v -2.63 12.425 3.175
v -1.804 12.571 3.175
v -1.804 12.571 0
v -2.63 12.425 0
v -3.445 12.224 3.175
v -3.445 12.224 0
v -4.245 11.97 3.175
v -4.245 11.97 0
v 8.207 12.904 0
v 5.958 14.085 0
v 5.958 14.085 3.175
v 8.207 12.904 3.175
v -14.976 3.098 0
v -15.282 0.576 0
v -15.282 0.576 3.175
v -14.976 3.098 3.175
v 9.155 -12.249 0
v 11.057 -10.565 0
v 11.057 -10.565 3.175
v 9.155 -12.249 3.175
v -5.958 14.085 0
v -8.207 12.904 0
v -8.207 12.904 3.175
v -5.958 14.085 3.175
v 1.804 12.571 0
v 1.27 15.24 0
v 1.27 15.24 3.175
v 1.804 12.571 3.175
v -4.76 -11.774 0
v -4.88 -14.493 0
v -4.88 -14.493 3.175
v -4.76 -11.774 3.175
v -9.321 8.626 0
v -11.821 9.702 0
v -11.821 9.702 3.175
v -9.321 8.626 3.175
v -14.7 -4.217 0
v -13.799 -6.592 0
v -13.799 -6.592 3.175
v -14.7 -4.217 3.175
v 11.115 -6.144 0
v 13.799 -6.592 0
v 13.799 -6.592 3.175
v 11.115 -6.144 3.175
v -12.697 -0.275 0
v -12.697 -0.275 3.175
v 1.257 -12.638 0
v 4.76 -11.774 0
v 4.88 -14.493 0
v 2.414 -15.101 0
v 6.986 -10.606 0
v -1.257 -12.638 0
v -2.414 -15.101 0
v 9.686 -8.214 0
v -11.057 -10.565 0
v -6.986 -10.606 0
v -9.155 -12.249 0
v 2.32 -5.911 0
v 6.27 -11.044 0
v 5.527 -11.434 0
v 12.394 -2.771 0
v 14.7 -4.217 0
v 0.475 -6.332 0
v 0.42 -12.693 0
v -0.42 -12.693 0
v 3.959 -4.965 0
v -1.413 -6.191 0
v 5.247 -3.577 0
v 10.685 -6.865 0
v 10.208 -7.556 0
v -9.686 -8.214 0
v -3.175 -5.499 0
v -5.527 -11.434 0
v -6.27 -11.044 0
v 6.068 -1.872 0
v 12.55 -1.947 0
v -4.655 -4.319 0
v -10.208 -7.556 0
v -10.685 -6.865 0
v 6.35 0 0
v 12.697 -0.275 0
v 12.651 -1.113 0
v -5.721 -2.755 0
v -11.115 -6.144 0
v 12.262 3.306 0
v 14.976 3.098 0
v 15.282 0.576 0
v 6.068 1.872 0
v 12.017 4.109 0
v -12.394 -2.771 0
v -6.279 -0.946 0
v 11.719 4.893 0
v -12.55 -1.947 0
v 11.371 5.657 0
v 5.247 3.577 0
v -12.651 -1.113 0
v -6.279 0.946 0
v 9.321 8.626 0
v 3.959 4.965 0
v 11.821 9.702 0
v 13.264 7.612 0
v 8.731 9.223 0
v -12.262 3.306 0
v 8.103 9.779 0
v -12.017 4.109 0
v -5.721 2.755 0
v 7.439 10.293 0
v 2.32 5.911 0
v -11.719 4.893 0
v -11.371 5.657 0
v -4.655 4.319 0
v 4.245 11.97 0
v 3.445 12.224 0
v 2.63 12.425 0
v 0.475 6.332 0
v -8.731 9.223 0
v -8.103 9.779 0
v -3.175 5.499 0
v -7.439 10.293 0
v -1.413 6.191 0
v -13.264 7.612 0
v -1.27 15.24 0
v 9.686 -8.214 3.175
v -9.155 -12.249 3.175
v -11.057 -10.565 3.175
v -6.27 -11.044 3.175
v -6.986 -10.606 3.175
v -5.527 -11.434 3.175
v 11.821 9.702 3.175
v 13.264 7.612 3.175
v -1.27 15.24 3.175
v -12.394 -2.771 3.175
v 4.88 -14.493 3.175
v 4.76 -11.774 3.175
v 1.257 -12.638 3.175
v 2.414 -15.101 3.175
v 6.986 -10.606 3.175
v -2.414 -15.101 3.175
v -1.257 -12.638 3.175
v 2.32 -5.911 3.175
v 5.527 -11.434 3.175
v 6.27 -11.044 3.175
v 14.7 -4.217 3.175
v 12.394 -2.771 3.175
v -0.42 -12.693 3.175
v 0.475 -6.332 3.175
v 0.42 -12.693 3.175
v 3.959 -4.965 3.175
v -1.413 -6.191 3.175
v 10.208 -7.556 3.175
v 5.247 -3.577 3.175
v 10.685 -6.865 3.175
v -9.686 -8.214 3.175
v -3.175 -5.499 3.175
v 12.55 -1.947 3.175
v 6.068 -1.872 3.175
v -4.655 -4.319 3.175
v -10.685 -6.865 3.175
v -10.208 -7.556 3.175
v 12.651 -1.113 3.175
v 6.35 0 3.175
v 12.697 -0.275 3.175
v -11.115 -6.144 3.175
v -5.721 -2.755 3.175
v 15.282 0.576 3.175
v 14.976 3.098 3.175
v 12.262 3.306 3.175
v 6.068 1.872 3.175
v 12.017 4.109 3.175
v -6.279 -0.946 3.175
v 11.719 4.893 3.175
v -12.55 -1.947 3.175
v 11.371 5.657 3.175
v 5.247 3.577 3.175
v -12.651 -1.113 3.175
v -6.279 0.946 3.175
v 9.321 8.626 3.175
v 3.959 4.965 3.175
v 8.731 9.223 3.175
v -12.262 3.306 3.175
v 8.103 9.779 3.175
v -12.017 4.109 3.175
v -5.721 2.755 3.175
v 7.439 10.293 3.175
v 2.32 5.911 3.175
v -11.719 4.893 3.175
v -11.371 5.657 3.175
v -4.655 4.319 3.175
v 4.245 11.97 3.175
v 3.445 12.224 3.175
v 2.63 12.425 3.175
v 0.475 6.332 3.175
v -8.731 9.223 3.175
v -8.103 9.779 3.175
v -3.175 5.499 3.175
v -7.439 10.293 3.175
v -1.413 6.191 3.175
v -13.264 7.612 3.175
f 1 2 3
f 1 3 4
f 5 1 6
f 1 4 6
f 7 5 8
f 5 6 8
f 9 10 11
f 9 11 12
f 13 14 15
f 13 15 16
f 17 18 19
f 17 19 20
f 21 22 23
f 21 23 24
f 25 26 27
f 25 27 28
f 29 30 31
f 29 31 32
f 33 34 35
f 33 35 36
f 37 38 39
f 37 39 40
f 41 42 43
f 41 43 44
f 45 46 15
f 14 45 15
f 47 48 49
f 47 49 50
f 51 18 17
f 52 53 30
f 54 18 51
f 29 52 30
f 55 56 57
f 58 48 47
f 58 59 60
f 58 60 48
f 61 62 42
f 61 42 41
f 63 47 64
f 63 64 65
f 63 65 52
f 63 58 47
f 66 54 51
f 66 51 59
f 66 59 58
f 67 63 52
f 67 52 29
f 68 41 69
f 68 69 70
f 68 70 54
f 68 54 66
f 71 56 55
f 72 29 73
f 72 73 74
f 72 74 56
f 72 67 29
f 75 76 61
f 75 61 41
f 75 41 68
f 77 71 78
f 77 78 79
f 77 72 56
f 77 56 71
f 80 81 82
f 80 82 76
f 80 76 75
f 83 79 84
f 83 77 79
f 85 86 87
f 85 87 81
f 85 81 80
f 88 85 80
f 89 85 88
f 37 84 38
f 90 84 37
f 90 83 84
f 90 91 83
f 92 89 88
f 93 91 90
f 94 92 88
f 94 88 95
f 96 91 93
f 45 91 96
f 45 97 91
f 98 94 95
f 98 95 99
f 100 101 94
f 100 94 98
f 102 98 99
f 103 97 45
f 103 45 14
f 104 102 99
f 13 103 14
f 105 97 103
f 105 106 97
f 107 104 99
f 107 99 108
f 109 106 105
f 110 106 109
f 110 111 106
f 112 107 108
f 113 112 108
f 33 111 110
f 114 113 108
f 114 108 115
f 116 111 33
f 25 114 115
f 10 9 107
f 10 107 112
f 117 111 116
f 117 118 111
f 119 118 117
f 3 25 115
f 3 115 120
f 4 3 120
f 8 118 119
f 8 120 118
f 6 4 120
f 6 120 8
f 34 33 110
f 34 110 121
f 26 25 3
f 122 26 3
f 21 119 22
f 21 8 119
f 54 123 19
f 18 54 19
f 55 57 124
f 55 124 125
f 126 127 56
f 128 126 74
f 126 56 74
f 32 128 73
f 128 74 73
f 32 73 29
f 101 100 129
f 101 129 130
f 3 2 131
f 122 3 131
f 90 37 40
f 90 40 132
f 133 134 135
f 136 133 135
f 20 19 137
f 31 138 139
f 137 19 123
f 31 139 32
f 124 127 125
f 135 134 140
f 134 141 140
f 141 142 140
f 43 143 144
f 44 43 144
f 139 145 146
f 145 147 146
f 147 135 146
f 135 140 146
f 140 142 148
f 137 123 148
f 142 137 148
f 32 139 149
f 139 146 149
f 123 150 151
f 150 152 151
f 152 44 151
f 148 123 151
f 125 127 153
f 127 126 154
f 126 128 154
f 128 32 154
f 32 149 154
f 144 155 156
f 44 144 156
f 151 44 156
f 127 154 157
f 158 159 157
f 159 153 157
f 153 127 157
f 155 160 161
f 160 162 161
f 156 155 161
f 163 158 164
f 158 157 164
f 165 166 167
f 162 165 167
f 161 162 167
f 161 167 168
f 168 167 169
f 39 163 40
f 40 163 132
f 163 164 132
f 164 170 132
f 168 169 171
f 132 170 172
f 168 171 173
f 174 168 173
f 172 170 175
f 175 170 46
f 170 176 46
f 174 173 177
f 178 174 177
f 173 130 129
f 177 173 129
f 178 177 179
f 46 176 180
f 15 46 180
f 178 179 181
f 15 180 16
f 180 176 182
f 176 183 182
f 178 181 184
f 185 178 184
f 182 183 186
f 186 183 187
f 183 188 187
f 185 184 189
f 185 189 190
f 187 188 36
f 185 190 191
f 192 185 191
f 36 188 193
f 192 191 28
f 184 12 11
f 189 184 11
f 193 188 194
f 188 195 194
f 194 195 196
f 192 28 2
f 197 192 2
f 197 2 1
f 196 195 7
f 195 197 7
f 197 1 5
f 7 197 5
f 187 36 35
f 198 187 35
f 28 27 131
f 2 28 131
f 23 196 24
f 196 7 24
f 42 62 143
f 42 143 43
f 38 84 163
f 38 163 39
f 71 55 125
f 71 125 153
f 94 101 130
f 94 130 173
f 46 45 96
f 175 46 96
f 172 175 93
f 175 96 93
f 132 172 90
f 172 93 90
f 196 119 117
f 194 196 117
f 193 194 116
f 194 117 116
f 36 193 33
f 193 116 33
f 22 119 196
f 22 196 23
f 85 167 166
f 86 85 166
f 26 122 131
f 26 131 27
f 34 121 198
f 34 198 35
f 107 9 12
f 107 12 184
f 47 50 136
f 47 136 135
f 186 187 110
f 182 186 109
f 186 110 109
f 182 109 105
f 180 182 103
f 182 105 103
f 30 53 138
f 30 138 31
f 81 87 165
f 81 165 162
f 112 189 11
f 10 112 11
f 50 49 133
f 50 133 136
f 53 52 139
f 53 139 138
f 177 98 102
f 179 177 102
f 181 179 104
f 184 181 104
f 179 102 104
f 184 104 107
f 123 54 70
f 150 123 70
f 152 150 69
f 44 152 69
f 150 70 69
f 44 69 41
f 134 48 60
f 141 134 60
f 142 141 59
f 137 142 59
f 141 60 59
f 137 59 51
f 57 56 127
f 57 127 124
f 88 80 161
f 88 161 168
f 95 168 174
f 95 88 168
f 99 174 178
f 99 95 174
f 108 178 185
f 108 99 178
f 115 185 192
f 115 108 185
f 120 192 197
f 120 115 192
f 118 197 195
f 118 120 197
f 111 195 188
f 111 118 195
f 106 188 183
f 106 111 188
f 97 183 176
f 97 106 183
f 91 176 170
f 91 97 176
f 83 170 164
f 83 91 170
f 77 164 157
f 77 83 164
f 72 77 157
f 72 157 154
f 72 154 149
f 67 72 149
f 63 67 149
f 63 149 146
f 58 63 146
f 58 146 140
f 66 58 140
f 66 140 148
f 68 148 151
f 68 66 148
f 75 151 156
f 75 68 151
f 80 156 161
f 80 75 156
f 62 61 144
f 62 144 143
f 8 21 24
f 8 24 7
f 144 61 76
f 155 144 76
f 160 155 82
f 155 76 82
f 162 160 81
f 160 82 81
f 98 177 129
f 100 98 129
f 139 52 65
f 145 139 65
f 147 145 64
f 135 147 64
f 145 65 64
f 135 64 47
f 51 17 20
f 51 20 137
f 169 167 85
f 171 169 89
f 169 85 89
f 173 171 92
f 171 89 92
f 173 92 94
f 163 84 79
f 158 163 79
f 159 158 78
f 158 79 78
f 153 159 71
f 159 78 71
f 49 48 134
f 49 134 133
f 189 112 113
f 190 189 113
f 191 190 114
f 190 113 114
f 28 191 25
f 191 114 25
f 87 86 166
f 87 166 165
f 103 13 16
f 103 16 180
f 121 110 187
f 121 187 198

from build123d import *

# Parameters (mm, degrees)
SKETCH1_R           = 12.7
SKETCH1_R_2         = 6.35
BOSS_EXTRUDE1_DEPTH = 3.175
BOSS_EXTRUDE2_DEPTH = 3.175
CIRPATTERN1_COUNT   = 13


with BuildPart() as part:
    # Sketch1 → Boss-Extrude1 (new body)
    with BuildSketch(Plane.XY):
        Circle(SKETCH1_R)
        Circle(SKETCH1_R_2, mode=Mode.SUBTRACT)
    extrude(amount=BOSS_EXTRUDE1_DEPTH)

    # Sketch2 → Boss-Extrude2 (add)
    with BuildSketch(Plane.XY):
        Polygon((-1.27, 15.24), (1.27, 15.24), (1.905, 12.065), (-1.905, 12.065), align=None)
    boss_extrude2 = extrude(amount=BOSS_EXTRUDE2_DEPTH)

    # CirPattern1: Boss-Extrude2 ×13 about axis
    cirpattern1_axis = Axis((0, 0, 0), (0, 0, 1))
    for i in range(1, CIRPATTERN1_COUNT):
        add(boss_extrude2.rotate(cirpattern1_axis, i * 360 / CIRPATTERN1_COUNT))


solid = part.part
